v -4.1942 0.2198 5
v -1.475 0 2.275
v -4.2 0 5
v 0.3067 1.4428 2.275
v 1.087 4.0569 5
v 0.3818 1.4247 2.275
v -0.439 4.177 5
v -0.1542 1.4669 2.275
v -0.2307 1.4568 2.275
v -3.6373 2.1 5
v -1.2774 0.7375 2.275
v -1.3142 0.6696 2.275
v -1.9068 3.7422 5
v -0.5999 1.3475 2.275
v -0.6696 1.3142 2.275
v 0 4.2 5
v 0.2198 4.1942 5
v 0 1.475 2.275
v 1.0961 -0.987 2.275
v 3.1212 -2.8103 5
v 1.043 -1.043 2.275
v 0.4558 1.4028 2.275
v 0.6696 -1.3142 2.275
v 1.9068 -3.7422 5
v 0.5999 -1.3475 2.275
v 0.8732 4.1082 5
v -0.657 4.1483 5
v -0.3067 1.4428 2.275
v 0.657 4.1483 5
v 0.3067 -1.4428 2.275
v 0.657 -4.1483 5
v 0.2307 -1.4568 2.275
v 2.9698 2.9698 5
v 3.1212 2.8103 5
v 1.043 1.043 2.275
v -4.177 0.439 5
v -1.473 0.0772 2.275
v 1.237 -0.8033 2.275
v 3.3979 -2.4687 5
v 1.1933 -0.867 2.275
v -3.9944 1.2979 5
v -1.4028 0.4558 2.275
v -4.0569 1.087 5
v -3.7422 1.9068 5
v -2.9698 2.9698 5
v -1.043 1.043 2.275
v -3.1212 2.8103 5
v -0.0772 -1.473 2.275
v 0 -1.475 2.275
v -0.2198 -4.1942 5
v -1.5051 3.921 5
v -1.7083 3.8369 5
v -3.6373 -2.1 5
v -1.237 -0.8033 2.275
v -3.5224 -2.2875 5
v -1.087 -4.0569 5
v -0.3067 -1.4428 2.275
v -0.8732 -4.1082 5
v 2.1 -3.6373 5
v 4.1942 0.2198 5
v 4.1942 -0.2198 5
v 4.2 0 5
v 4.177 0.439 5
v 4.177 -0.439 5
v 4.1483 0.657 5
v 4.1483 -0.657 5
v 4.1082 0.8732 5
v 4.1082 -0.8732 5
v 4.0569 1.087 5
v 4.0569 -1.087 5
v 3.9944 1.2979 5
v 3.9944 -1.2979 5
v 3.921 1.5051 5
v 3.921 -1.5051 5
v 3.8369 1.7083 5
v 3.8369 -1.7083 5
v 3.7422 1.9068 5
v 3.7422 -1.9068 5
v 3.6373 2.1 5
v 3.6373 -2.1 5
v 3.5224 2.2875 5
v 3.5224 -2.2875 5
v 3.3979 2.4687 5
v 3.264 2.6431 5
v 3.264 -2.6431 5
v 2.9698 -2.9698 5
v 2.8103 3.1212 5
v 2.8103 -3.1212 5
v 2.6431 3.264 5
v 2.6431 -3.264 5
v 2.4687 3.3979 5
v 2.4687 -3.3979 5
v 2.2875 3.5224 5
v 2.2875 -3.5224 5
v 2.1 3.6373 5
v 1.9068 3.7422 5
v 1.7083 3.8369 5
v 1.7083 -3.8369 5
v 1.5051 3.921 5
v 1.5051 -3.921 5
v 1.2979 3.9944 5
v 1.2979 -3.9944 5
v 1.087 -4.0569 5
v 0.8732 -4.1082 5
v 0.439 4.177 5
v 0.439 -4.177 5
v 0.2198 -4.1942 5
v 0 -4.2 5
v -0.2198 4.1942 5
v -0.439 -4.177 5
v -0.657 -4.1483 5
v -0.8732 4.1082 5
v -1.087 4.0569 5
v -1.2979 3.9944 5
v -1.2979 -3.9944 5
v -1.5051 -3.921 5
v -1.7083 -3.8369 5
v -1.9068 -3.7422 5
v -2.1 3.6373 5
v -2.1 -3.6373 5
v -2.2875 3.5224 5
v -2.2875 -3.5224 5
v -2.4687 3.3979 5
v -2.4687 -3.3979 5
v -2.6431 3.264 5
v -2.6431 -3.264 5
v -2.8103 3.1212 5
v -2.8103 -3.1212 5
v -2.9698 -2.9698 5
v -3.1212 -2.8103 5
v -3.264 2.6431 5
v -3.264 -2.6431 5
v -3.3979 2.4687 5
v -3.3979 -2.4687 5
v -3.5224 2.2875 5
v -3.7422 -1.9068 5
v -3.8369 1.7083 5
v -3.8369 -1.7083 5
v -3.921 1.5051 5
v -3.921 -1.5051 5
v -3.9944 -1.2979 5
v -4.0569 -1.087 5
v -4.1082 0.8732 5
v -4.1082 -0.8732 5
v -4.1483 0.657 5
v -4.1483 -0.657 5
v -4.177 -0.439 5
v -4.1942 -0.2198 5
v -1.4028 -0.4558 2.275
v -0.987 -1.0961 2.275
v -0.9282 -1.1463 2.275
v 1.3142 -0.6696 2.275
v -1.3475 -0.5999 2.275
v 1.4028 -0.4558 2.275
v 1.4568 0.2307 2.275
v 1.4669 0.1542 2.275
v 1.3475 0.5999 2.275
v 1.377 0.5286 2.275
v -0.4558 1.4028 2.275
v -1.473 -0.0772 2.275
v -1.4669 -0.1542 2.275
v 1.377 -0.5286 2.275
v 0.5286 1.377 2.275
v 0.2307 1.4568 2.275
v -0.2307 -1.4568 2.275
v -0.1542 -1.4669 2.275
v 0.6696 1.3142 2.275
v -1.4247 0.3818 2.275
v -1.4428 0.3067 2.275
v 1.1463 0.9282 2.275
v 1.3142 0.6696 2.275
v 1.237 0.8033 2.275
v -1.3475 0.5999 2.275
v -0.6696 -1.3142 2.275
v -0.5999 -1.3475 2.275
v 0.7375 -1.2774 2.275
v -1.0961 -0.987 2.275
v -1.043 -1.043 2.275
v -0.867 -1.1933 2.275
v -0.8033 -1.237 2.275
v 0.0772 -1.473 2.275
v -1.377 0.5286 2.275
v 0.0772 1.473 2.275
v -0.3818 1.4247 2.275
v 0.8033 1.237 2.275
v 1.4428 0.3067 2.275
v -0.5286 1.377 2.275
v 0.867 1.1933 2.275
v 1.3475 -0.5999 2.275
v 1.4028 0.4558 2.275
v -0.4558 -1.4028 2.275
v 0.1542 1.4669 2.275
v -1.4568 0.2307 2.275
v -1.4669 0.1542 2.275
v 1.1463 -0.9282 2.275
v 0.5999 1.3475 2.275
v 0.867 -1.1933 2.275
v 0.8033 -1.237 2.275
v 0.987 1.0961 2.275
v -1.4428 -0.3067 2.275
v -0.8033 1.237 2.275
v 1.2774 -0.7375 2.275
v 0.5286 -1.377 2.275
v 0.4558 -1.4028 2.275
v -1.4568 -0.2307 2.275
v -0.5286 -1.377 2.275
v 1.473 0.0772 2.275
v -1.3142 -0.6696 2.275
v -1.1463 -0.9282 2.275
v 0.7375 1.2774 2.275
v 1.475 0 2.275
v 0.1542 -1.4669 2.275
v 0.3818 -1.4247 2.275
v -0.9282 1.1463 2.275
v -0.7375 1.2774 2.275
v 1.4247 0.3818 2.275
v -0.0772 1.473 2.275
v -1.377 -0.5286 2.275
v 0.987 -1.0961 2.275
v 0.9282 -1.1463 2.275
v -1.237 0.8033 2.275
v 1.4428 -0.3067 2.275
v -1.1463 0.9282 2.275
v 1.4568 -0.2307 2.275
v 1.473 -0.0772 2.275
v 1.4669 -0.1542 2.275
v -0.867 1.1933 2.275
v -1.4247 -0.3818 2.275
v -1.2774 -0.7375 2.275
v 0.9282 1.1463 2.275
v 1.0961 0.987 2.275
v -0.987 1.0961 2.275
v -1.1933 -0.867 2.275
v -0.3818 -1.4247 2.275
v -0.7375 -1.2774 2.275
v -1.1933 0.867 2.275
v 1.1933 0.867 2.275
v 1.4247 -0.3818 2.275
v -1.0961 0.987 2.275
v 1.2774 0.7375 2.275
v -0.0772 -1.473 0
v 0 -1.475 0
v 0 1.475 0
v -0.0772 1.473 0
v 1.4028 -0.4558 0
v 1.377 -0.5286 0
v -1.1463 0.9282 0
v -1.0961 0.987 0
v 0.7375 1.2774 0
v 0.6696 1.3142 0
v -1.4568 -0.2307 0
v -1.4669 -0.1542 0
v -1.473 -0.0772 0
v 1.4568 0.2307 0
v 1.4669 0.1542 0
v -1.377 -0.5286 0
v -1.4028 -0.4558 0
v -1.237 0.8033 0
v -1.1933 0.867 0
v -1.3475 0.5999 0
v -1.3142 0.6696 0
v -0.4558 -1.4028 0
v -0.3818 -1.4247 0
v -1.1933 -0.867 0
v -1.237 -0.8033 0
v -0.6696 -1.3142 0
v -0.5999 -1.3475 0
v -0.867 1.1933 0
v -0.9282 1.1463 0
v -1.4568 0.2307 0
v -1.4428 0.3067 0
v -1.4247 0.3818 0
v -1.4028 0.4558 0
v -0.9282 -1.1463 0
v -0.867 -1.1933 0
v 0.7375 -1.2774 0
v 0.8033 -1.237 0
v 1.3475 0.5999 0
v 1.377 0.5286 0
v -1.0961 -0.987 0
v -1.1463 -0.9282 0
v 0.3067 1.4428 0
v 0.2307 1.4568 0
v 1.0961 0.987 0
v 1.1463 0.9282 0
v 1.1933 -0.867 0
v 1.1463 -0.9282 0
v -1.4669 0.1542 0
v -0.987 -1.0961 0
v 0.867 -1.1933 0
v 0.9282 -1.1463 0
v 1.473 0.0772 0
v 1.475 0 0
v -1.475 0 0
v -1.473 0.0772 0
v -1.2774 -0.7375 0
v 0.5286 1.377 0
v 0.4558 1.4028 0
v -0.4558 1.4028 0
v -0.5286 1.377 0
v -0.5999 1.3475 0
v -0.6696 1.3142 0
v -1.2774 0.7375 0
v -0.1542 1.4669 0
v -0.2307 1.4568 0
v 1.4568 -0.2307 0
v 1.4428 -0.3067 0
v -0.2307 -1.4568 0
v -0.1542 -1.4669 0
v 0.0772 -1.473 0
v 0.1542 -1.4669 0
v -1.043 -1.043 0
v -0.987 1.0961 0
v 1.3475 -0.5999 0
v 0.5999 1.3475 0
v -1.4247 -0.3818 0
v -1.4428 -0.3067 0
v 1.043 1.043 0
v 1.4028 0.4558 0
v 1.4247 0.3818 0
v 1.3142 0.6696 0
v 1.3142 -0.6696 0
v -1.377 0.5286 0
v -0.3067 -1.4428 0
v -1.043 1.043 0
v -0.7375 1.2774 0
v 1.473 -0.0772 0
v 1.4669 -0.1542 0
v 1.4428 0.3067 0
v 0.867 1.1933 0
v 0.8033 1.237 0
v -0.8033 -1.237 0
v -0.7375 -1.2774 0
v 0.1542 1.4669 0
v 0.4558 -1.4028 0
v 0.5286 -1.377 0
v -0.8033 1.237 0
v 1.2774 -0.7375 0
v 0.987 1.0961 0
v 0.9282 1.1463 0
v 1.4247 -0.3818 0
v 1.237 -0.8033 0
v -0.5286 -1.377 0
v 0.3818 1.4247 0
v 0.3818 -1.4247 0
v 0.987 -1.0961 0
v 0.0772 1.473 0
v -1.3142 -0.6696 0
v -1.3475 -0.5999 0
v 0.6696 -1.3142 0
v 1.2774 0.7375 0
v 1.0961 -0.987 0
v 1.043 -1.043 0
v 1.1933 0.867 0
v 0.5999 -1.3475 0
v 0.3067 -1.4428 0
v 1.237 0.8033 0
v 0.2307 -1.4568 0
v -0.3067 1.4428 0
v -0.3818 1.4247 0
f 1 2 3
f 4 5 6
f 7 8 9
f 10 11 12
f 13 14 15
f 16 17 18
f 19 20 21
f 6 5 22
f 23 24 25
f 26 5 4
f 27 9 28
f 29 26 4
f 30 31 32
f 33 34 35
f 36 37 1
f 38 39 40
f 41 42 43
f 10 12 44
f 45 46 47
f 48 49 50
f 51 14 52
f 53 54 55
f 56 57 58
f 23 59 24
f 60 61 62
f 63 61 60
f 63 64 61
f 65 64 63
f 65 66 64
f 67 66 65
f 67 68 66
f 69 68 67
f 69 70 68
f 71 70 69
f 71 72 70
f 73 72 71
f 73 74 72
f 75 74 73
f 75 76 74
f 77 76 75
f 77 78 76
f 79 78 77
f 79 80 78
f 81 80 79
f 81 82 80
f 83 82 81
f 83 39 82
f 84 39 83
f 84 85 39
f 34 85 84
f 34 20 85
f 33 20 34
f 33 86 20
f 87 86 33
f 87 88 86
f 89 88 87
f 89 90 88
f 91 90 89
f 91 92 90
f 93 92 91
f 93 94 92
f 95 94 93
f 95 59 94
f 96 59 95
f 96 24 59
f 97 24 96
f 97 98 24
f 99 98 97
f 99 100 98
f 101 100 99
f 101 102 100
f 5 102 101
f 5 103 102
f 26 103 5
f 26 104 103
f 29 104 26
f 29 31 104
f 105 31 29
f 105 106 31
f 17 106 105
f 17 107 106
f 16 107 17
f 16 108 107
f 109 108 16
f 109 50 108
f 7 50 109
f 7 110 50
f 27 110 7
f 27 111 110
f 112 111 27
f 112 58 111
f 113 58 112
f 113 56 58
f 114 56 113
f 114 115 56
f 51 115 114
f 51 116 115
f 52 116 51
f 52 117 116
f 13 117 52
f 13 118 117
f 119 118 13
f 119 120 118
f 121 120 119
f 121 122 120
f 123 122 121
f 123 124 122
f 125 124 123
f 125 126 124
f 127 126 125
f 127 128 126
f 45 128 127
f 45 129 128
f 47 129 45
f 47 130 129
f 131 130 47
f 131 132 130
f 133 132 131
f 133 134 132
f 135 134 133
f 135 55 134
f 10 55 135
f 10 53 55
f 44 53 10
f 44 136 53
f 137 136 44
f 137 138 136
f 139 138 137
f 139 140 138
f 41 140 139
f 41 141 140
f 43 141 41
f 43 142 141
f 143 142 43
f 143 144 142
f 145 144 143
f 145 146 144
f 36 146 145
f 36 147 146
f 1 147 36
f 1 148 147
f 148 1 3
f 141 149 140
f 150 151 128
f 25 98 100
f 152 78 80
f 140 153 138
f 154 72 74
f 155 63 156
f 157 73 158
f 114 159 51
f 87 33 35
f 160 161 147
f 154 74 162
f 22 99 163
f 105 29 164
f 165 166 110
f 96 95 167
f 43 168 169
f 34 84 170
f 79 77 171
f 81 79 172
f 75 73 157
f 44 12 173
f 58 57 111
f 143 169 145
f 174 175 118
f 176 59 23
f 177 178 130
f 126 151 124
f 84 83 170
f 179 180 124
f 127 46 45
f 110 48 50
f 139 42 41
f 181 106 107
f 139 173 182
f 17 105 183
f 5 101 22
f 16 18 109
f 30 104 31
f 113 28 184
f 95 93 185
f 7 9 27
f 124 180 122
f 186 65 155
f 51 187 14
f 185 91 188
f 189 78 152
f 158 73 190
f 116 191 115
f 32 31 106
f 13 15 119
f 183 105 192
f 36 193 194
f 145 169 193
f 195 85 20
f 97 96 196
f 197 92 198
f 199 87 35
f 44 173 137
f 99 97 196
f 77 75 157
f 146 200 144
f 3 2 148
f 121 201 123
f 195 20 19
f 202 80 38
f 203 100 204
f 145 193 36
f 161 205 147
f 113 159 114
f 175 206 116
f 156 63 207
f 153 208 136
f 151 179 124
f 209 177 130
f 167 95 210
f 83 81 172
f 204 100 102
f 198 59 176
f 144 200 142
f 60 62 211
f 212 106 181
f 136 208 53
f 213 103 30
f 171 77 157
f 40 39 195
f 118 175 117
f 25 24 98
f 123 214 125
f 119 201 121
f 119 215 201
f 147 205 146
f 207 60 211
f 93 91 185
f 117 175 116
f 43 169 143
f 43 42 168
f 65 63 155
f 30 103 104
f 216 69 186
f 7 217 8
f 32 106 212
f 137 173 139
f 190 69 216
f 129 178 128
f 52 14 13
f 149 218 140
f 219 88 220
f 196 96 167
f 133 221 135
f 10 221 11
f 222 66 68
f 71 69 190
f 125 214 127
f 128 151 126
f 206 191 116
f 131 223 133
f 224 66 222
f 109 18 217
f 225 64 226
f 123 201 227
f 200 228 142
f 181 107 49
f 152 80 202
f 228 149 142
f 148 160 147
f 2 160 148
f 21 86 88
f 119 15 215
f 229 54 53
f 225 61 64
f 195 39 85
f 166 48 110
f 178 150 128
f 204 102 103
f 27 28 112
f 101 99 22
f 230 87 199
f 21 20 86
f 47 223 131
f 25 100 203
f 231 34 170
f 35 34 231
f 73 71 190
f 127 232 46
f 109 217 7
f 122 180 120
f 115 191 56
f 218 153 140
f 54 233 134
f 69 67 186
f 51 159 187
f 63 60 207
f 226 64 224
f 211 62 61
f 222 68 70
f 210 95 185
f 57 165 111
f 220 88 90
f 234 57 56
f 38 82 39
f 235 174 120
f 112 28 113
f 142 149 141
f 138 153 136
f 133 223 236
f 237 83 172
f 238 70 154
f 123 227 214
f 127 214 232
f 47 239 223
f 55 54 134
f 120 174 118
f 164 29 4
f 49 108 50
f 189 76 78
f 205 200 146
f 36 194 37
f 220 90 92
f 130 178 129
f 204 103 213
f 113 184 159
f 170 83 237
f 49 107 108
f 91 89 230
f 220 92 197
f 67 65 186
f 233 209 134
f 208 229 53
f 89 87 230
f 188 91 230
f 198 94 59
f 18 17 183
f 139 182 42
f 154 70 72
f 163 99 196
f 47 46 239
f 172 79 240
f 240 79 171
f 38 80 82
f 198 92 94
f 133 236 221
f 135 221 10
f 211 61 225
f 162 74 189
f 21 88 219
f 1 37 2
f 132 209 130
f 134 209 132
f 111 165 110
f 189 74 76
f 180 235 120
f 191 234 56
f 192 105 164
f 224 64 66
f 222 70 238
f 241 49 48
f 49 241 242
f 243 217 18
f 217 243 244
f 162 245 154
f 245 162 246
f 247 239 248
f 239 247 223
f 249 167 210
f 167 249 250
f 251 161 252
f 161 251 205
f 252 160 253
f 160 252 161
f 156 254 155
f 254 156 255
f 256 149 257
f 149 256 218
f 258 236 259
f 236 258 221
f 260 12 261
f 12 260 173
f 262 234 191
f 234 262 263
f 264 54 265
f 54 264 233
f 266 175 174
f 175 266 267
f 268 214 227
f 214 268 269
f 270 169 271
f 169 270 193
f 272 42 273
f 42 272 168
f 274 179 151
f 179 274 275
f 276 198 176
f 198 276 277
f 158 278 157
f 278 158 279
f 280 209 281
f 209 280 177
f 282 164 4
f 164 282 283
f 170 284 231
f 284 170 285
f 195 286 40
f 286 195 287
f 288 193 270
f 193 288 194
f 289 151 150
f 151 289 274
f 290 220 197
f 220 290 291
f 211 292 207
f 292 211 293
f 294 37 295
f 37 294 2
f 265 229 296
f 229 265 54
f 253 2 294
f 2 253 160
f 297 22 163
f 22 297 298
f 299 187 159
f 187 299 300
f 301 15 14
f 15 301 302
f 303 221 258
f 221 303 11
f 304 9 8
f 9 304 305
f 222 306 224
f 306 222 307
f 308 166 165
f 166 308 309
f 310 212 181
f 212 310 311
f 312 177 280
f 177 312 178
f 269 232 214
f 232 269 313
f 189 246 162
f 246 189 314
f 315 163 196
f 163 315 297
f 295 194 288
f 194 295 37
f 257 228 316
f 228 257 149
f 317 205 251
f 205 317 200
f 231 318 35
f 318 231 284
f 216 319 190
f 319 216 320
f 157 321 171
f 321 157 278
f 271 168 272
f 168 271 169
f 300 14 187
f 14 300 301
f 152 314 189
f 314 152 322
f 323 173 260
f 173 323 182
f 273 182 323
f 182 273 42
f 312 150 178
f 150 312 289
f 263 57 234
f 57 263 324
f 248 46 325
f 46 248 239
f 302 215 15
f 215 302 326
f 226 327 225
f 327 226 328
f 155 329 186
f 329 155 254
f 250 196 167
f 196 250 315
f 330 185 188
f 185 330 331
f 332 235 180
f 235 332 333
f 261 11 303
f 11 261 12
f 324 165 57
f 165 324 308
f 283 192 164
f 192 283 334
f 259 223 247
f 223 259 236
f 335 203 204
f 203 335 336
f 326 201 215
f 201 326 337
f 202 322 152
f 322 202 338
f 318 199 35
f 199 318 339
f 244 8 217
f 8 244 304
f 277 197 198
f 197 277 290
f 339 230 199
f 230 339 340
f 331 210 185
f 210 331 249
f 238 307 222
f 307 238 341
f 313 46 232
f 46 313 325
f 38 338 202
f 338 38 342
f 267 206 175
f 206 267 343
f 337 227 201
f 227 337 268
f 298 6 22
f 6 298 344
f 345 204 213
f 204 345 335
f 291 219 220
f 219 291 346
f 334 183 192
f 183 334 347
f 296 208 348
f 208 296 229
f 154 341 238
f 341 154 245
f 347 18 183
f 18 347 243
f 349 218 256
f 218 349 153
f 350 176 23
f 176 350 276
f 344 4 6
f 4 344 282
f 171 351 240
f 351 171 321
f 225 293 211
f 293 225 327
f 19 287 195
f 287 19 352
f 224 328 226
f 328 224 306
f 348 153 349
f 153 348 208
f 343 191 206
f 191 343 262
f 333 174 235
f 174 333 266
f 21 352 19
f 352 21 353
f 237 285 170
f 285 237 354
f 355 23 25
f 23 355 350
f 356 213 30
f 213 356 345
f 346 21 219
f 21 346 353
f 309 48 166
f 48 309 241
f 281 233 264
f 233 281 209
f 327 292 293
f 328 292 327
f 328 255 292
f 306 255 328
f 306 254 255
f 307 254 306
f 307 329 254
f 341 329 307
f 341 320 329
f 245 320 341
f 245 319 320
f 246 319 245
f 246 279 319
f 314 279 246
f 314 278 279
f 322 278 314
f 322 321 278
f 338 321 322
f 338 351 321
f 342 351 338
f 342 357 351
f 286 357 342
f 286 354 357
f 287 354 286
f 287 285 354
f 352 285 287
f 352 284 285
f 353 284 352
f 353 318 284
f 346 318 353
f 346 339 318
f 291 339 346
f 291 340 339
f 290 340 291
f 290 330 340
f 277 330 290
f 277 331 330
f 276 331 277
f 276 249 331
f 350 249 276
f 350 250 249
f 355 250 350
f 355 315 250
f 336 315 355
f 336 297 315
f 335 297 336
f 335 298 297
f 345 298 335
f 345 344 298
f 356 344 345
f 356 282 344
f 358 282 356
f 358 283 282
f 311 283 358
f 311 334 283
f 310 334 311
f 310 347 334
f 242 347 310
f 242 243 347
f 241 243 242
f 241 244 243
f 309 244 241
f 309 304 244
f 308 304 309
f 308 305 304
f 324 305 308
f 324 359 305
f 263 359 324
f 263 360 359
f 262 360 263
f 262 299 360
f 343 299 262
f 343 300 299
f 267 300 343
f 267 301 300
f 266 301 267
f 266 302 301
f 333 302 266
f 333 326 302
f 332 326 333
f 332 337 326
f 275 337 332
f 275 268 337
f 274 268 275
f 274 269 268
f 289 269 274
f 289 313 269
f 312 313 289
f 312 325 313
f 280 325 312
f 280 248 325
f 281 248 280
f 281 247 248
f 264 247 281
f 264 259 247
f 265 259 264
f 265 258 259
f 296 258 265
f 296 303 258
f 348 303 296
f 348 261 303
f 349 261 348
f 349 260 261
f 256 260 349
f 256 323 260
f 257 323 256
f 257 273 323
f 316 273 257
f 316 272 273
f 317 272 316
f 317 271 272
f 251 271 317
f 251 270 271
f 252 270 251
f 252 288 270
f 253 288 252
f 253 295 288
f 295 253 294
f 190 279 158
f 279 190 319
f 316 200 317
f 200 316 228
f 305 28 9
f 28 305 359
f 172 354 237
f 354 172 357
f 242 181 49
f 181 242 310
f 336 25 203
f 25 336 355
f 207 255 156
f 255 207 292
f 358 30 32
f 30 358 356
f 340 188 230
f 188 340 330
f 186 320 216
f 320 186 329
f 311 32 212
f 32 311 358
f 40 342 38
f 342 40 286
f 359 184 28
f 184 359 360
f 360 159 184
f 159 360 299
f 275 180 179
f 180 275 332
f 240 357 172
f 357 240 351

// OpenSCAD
/*

SPAX measurements

Use function `spax(size)` to get a vector with spax measurements

Indexes in the vector:

    0: thread size
    1: head diameter
    2: core diameter
    3: shank diameter
    4: head height
    5: thread pitch
    6: height max length


Mostly you'd want a hole for a screw: `spax_bore_hole(size, total_height=0)`
If total_height is set to 0, the height of the head will be used.

the available spax sizes are 2.5, 3, 3.5, 4, 4.5, 5, 6 and 7.

*/



THREAD_SIZE_TOLERANCE = 0.15;
HEAD_DIAMETER_TOLERANCE = 0.4;
CORE_DIAMETER_TOLERANCE = 0.25;
SHANK_DIAMETER_TOLERANCE = 0.1;
THRED_PITCH_TOLERANCE = 0.1;
HEAD_ANGLE = 90;


SPAX_25_THREAD_SIZE = 2.5;
SPAX_25_HEAD_DIAMETER = 5.1;
SPAX_25_CORE_DIAMETER = 1.7;
SPAX_25_SHANK_DIAMETER = 1.8;
SPAX_25_HEAD_HEIGHT = 1.6;
SPAX_25_THREAD_PITCH = 1.3;
SPAX_25_HEIGHT_MAX_LENGTH = 13 - 10;
SPAX_25_VECTOR = [
    SPAX_25_THREAD_SIZE,
    SPAX_25_HEAD_DIAMETER,
    SPAX_25_CORE_DIAMETER,
    SPAX_25_SHANK_DIAMETER,
    SPAX_25_HEAD_HEIGHT,
    SPAX_25_THREAD_PITCH,
    SPAX_25_HEIGHT_MAX_LENGTH
];


SPAX_30_THREAD_SIZE = 3;
SPAX_30_HEAD_DIAMETER = 6;
SPAX_30_CORE_DIAMETER = 3;
SPAX_30_SHANK_DIAMETER = 2.15;
SPAX_30_HEAD_HEIGHT = 1.8;
SPAX_30_THREAD_PITCH = 1.5;
SPAX_30_HEIGHT_MAX_LENGTH = 15.5 - 12.5;
SPAX_30_VECTOR = [
    SPAX_30_THREAD_SIZE,
    SPAX_30_HEAD_DIAMETER,
    SPAX_30_CORE_DIAMETER,
    SPAX_30_SHANK_DIAMETER,
    SPAX_30_HEAD_HEIGHT,
    SPAX_30_THREAD_PITCH,
    SPAX_30_HEIGHT_MAX_LENGTH
];


SPAX_35_THREAD_SIZE = 3.5;
SPAX_35_HEAD_DIAMETER = 7;
SPAX_35_CORE_DIAMETER = 2.2;
SPAX_35_SHANK_DIAMETER = 2.45;
SPAX_35_HEAD_HEIGHT = 2.1;
SPAX_35_THREAD_PITCH = 1.8;
SPAX_35_HEIGHT_MAX_LENGTH = 20.5 - 16;
SPAX_35_VECTOR = [
    SPAX_35_THREAD_SIZE,
    SPAX_35_HEAD_DIAMETER,
    SPAX_35_CORE_DIAMETER,
    SPAX_35_SHANK_DIAMETER,
    SPAX_35_HEAD_HEIGHT,
    SPAX_35_THREAD_PITCH,
    SPAX_35_HEIGHT_MAX_LENGTH
];


SPAX_40_THREAD_SIZE = 4;
SPAX_40_HEAD_DIAMETER = 8;
SPAX_40_CORE_DIAMETER = 2.5;
SPAX_40_SHANK_DIAMETER = 2.85;
SPAX_40_HEAD_HEIGHT = 2.4;
SPAX_40_THREAD_PITCH = 2;
SPAX_40_HEIGHT_MAX_LENGTH = 20.5 - 16;
SPAX_40_VECTOR = [
    SPAX_40_THREAD_SIZE,
    SPAX_40_HEAD_DIAMETER,
    SPAX_40_CORE_DIAMETER,
    SPAX_40_SHANK_DIAMETER,
    SPAX_40_HEAD_HEIGHT,
    SPAX_40_THREAD_PITCH,
    SPAX_40_HEIGHT_MAX_LENGTH
];


SPAX_45_THREAD_SIZE = 4.5;
SPAX_45_HEAD_DIAMETER = 8.8;
SPAX_45_CORE_DIAMETER = 2.8;
SPAX_45_SHANK_DIAMETER = 3.2;
SPAX_45_HEAD_HEIGHT = 2.7;
SPAX_45_THREAD_PITCH = 2.2;
SPAX_45_HEIGHT_MAX_LENGTH = 25.5 - 20;
SPAX_45_VECTOR = [
    SPAX_45_THREAD_SIZE,
    SPAX_45_HEAD_DIAMETER,
    SPAX_45_CORE_DIAMETER,
    SPAX_45_SHANK_DIAMETER,
    SPAX_45_HEAD_HEIGHT,
    SPAX_45_THREAD_PITCH,
    SPAX_45_HEIGHT_MAX_LENGTH
];


SPAX_50_THREAD_SIZE = 5;
SPAX_50_HEAD_DIAMETER = 9.7;
SPAX_50_CORE_DIAMETER = 3.1;
SPAX_50_SHANK_DIAMETER = 3.55;
SPAX_50_HEAD_HEIGHT = 2.9;
SPAX_50_THREAD_PITCH = 2.5;
SPAX_50_HEIGHT_MAX_LENGTH = 36 - 25;
SPAX_50_VECTOR = [
    SPAX_50_THREAD_SIZE,
    SPAX_50_HEAD_DIAMETER,
    SPAX_50_CORE_DIAMETER,
    SPAX_50_SHANK_DIAMETER,
    SPAX_50_HEAD_HEIGHT,
    SPAX_50_THREAD_PITCH,
    SPAX_50_HEIGHT_MAX_LENGTH
];


SPAX_60_THREAD_SIZE = 6;
SPAX_60_HEAD_DIAMETER = 11.3;
SPAX_60_CORE_DIAMETER = 3.8;
SPAX_60_SHANK_DIAMETER = 4.3;
SPAX_60_HEAD_HEIGHT = 3.4;
SPAX_60_THREAD_PITCH = 3.0;
SPAX_60_HEIGHT_MAX_LENGTH = 30.5 - 24;
SPAX_60_VECTOR = [
    SPAX_60_THREAD_SIZE,
    SPAX_60_HEAD_DIAMETER,
    SPAX_60_CORE_DIAMETER,
    SPAX_60_SHANK_DIAMETER,
    SPAX_60_HEAD_HEIGHT,
    SPAX_60_THREAD_PITCH,
    SPAX_60_HEIGHT_MAX_LENGTH
];


SPAX_70_THREAD_SIZE = 7;
SPAX_70_HEAD_DIAMETER = 13.1;
SPAX_70_CORE_DIAMETER = 4.5;
SPAX_70_SHANK_DIAMETER = 4.9;
SPAX_70_HEAD_HEIGHT = 3.8;
SPAX_70_THREAD_PITCH = 3.5;
SPAX_70_HEIGHT_MAX_LENGTH = 41 - 33;
SPAX_70_VECTOR = [
    SPAX_70_THREAD_SIZE,
    SPAX_70_HEAD_DIAMETER,
    SPAX_70_CORE_DIAMETER,
    SPAX_70_SHANK_DIAMETER,
    SPAX_70_HEAD_HEIGHT,
    SPAX_70_THREAD_PITCH,
    SPAX_70_HEIGHT_MAX_LENGTH
];


SPAX_VECTORS = [
    SPAX_25_VECTOR,
    SPAX_30_VECTOR,
    SPAX_35_VECTOR,
    SPAX_40_VECTOR,
    SPAX_45_VECTOR,
    SPAX_50_VECTOR,
    SPAX_60_VECTOR,
    SPAX_70_VECTOR
];

SPAX_SIZES = [2.5, 3, 3.5, 4, 4.5, 5, 6, 7];


function _spax_index(size) = search(size, SPAX_SIZES)[0];
function spax(size) = SPAX_VECTORS[_spax_index(size)];

function spax_max_head_diameter(size) =
    let(screw = spax(size))
    screw[1] + HEAD_DIAMETER_TOLERANCE;

function spax_max_shank_diameter(size) =
    let(screw = spax(size))
    screw[3] + SHANK_DIAMETER_TOLERANCE;

function spax_max_head_height(size) =
    let(
        screw = spax(size),
        head_diameter = spax_max_head_diameter(size),
        shank_diameter = spax_max_shank_diameter(size)
    )
    (head_diameter - shank_diameter) / 2;


module spax_bore_hole(size, total_height=0) {
    shank_diameter = spax_max_shank_diameter(size);
    head_diameter = spax_max_head_diameter(size);
    head_height = spax_max_head_height(size);
    shank_height = max(head_height,  total_height);
    cylinder(head_height, d1=head_diameter, d2=shank_diameter, $fn=120);
    cylinder(shank_height, d=shank_diameter, $fn=120);
}

translate([0, 0, 5])rotate([0, 180, 0])spax_bore_hole(4, 5);
